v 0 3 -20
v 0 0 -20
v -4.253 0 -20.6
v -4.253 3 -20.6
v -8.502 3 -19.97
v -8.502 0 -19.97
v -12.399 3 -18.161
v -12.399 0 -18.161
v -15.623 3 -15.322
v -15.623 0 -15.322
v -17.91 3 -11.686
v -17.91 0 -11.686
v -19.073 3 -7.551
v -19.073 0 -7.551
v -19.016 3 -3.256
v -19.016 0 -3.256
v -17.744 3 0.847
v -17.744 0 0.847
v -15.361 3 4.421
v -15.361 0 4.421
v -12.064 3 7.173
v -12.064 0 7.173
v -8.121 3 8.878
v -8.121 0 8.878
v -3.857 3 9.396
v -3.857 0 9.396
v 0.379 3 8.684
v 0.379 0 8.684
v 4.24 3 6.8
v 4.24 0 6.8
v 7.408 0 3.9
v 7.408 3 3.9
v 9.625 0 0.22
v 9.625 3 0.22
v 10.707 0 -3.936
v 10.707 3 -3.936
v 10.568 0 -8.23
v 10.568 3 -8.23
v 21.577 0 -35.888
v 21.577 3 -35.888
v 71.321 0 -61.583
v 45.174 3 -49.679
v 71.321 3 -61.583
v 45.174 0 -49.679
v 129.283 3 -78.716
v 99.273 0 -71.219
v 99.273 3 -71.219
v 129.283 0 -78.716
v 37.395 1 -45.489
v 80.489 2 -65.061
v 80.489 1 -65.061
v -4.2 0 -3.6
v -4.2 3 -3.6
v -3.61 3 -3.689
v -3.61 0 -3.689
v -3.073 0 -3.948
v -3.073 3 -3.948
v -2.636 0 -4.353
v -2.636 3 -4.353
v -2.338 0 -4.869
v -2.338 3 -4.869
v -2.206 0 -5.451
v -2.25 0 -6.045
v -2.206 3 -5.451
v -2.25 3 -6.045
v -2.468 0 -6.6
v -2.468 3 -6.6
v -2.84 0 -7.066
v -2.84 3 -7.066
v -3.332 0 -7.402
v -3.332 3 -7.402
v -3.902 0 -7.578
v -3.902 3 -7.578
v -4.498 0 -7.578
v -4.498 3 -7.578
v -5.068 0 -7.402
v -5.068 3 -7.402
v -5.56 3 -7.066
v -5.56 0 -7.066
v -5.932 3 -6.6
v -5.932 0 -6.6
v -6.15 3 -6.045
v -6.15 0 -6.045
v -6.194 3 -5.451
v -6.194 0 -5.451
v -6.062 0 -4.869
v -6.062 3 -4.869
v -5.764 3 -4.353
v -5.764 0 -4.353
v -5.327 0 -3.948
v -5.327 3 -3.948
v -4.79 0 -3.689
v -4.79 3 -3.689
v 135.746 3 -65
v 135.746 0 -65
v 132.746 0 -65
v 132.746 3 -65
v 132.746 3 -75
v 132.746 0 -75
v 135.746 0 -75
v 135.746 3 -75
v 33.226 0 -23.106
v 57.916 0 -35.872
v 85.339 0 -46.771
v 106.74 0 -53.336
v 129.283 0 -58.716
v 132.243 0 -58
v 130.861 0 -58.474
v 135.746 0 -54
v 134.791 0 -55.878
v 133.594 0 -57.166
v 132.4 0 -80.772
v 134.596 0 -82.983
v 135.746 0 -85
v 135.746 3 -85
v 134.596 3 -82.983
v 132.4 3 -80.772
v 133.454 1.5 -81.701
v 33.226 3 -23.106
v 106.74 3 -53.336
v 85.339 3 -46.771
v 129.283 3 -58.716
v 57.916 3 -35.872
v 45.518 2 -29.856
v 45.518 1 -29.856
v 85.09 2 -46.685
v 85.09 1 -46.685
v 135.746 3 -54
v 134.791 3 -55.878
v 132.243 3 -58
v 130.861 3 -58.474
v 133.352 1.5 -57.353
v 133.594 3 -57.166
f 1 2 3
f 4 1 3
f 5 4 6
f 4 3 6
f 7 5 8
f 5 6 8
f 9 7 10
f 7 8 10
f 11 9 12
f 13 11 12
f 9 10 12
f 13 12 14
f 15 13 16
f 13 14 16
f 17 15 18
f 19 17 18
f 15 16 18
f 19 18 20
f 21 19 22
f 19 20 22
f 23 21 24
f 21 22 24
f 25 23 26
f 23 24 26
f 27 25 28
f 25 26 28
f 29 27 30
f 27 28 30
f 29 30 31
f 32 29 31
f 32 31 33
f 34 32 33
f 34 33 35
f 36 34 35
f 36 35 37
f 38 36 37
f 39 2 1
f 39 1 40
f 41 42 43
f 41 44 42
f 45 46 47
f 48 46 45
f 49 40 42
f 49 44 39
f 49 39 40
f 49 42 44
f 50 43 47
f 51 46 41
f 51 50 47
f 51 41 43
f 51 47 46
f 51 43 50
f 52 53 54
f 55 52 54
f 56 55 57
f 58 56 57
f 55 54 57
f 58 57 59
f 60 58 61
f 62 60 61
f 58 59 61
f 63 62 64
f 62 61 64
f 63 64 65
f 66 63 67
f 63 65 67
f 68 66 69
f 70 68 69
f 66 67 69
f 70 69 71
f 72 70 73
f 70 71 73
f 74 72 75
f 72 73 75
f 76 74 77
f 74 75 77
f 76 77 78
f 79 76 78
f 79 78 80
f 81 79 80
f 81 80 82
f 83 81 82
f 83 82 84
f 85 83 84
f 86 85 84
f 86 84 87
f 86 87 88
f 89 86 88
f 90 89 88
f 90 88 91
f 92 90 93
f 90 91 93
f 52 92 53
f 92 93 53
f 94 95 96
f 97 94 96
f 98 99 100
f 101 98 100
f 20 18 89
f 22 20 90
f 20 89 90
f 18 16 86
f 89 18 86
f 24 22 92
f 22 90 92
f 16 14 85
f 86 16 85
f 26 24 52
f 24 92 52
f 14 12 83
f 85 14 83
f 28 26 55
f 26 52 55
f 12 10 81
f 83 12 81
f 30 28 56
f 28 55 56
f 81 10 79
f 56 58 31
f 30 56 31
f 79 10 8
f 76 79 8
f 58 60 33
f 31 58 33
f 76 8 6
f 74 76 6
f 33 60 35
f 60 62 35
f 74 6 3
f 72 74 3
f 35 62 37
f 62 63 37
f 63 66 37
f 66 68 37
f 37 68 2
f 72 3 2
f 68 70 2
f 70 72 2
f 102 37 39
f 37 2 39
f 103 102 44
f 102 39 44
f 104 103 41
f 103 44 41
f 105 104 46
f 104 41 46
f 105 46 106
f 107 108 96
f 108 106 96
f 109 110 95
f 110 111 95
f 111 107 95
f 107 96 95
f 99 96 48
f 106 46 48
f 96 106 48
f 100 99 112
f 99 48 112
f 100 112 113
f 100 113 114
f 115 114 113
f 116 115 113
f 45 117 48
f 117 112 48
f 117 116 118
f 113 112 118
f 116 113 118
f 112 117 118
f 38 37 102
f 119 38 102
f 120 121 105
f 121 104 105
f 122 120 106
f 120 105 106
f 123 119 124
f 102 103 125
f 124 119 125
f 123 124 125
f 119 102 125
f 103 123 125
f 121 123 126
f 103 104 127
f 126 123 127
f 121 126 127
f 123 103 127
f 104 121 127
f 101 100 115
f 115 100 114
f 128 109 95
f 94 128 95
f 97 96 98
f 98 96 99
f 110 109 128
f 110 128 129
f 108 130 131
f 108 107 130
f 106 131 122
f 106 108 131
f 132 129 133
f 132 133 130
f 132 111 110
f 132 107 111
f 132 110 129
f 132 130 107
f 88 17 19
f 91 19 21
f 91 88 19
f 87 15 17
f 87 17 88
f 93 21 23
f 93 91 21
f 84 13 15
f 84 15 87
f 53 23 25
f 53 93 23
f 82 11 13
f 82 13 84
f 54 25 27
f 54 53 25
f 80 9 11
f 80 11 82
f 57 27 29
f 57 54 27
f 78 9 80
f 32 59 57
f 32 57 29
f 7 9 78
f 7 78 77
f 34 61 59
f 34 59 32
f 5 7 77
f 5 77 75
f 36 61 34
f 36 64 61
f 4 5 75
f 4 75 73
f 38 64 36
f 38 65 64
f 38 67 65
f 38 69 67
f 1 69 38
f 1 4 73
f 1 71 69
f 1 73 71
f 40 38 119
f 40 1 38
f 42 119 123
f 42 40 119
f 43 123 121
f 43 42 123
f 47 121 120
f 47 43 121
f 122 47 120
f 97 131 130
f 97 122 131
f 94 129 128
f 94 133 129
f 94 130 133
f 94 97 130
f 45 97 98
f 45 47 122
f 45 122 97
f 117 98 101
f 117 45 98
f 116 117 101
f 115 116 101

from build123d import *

# Parameters (mm, degrees)
BOSS_EXTRUDE2_DEPTH = 3
SKETCH4_R           = 2
CUT_EXTRUDE2_DEPTH  = 3


with BuildPart() as part:
    # Sketch3 → Boss-Extrude2 (new body)
    with BuildSketch(Plane(origin=(0, 0, 0), x_dir=(1, 0, 0), z_dir=(0, 1, 0))):
        with BuildLine():
            ThreePointArc((0, 20.000004284), (-15.361487959, -4.421029535), (10.567709202, 8.229620236))
            add(Edge.make_bspline(
                [(10.567709202, 8.229620236), (43.206989346, 32.255448903), (82.778918939, 49.08436074), (129.283499892, 58.71635639)],
                knots=[0.095561107, 0.095561107, 0.095561107, 0.095561107, 0.960221945, 0.960221945, 0.960221945, 0.960221945], degree=3))
            add(Edge.make_bspline(
                [(135.745739898, 54), (134.188411223, 58.347154687), (129.283499892, 58.71635639)],
                knots=[0, 0, 0, 1, 1, 1], degree=2))
            Line((135.745739898, 54), (135.745739898, 65))
            Line((135.745739898, 65), (132.745739898, 65))
            Line((132.745739898, 65), (132.745739898, 75))
            Line((132.745739898, 75), (135.745739898, 75))
            Line((135.745739898, 75), (135.745739898, 85))
            add(Edge.make_bspline(
                [(135.745739898, 85), (134.392955154, 81.542928592), (129.283499131, 78.716356348)],
                knots=[0, 0, 0, 1, 1, 1], degree=2))
            add(Edge.make_bspline(
                [(0, 20.000004284), (34.544798533, 48.4477318), (77.639296954, 68.019848628), (129.283499131, 78.716356348)],
                knots=[0, 0, 0, 0, 0.960221944, 0.960221944, 0.960221944, 0.960221944], degree=3))
        make_face()
    extrude(amount=BOSS_EXTRUDE2_DEPTH)

    # Sketch4 → Cut-Extrude2 (cut)
    with BuildSketch(Plane(origin=(0, 3, 0), x_dir=(1, 0, 0), z_dir=(0, 1, 0))):
        with Locations(Location((-4.199995888, 5.600003084, 0), (0, 0, 270))):
            Circle(SKETCH4_R)
    extrude(amount=-CUT_EXTRUDE2_DEPTH, mode=Mode.SUBTRACT)


solid = part.part
